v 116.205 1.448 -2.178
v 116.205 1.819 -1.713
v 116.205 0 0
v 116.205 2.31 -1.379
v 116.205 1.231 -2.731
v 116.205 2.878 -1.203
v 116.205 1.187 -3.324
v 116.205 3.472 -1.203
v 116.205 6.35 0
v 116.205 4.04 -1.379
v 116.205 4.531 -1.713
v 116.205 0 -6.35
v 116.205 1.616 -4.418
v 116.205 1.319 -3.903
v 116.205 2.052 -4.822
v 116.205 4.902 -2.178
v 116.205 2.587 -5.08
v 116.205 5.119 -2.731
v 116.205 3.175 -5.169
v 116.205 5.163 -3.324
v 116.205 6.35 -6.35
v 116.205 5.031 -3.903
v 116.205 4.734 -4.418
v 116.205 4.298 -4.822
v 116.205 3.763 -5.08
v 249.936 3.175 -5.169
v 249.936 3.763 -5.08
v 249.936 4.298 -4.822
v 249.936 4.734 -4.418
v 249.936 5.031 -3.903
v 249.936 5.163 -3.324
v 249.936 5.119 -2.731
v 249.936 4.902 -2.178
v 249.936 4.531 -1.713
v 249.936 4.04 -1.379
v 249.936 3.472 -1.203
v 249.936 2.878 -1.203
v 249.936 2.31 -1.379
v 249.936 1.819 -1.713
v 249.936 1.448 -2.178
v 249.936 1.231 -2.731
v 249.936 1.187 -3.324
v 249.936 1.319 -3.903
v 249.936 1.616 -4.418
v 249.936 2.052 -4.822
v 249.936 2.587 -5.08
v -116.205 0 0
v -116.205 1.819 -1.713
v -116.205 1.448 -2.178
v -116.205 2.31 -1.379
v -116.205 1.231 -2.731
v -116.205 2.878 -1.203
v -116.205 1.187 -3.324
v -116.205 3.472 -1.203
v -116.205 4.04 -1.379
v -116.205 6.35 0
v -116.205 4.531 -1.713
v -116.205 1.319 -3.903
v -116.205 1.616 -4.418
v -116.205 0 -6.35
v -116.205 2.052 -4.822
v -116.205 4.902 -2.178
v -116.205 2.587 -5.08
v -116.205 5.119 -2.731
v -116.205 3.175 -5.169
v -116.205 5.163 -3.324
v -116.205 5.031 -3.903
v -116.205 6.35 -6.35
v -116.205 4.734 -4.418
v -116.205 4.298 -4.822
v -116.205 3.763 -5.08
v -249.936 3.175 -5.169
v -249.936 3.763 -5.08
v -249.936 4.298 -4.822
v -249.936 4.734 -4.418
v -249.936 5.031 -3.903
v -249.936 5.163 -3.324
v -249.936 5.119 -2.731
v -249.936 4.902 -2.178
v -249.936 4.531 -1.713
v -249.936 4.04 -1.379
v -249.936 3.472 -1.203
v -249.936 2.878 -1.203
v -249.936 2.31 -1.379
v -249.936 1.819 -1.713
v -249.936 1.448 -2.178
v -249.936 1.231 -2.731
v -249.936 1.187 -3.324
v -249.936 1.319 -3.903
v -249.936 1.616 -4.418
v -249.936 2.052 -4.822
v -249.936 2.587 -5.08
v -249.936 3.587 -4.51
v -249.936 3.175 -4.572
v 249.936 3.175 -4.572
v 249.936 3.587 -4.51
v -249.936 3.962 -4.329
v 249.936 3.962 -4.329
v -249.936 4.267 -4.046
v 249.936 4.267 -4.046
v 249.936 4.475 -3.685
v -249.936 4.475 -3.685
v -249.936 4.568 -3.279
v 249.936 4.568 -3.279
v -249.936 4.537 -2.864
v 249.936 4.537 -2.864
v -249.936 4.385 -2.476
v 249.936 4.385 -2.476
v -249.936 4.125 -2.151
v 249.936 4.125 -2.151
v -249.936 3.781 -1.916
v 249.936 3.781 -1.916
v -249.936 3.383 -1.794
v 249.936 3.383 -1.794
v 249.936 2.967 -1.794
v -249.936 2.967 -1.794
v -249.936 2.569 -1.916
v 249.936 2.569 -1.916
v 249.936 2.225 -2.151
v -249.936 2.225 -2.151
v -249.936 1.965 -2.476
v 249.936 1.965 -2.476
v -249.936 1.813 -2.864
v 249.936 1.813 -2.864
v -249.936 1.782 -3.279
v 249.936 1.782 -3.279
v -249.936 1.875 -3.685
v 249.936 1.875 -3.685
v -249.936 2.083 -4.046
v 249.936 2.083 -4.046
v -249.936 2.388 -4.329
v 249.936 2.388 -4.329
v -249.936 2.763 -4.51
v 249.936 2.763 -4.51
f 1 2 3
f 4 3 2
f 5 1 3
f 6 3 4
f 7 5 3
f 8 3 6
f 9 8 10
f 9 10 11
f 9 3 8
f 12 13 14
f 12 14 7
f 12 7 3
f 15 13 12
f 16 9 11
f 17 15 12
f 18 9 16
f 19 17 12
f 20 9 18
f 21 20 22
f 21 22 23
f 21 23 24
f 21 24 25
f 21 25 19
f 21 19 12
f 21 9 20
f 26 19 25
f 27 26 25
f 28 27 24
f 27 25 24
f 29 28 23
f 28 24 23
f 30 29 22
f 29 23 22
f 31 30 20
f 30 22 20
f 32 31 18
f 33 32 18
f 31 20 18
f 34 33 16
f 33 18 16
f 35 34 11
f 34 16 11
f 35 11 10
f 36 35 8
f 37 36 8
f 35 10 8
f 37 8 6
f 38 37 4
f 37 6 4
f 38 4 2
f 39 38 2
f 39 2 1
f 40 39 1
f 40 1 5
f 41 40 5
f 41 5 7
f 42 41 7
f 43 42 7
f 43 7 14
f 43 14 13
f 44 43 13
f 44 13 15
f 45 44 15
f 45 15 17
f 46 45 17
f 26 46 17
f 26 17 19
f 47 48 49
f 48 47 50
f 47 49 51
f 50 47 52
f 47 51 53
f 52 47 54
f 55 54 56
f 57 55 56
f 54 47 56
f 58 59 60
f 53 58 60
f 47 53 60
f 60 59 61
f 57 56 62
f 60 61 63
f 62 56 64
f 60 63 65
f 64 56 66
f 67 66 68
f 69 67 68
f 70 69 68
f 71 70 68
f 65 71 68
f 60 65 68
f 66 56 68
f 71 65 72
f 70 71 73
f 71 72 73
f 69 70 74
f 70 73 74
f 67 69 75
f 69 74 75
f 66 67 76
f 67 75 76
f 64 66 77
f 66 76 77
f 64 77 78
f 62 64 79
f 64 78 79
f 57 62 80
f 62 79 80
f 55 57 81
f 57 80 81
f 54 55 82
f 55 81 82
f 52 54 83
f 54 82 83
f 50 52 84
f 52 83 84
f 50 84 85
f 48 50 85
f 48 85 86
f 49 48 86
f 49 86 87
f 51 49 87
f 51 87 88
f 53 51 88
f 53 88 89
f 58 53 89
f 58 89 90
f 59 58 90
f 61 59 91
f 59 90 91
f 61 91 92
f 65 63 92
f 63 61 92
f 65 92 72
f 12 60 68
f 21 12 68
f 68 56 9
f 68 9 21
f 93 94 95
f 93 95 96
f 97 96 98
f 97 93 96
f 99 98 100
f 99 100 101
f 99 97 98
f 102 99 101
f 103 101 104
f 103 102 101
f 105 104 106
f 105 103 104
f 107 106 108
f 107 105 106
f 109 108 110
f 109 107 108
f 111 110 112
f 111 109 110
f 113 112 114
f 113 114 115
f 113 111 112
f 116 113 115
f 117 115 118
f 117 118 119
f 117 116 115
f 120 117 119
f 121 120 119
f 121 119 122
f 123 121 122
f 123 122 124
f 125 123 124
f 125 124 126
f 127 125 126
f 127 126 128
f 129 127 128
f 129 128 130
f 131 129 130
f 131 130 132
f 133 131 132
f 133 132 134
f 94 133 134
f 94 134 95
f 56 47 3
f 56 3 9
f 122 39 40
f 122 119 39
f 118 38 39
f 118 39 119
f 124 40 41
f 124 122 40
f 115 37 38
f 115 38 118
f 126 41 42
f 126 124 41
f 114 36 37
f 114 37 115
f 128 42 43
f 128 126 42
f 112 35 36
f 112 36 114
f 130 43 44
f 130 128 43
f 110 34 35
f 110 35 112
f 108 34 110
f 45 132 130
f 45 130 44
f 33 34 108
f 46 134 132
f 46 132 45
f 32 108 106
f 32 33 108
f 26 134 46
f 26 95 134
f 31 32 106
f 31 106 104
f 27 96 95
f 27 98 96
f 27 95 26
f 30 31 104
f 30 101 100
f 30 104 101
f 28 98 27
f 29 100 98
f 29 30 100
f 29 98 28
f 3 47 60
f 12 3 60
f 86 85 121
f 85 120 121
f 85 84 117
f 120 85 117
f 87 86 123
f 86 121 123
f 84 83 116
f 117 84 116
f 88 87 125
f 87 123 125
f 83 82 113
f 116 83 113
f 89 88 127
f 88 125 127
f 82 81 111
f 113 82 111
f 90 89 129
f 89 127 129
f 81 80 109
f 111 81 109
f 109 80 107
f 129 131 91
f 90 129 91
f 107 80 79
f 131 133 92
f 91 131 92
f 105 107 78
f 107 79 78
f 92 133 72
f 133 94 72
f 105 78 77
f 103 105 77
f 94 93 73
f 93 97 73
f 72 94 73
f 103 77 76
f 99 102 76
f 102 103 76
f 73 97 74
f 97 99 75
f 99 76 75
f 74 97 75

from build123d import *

# Parameters (mm, degrees)
BOSS_EXTRUDE1_DEPTH      = 116.205
BOSS_EXTRUDE1_DEPTH_BACK = 116.205
SKETCH1_W                = 6.35
SKETCH1_H                = 6.35
SKETCH1_R                = 1.397
BOSS_EXTRUDE3_DEPTH      = 249.936
BOSS_EXTRUDE3_DEPTH_BACK = 249.936
SKETCH3_R                = 1.9939
SKETCH3_R_2              = 1.397


with BuildPart() as part:
    # Sketch1 → Boss-Extrude1 (new, two sides: drawn at the far end of the back side and taken through both)
    with BuildSketch(Plane(origin=(0, 0, 0), x_dir=(0, 0, -1), z_dir=(1, 0, 0)).offset(-BOSS_EXTRUDE1_DEPTH_BACK)):
        with Locations((3.175, 3.175)):
            Rectangle(SKETCH1_W, SKETCH1_H)
        with Locations((3.175, 3.175)):
            Circle(SKETCH1_R, mode=Mode.SUBTRACT)
    extrude(amount=BOSS_EXTRUDE1_DEPTH + BOSS_EXTRUDE1_DEPTH_BACK)

    # Sketch3 → Boss-Extrude3 (add, two sides: drawn at the far end of the back side and taken through both)
    with BuildSketch(Plane(origin=(0, 0, 0), x_dir=(0, 0, -1), z_dir=(1, 0, 0)).offset(-BOSS_EXTRUDE3_DEPTH_BACK)):
        with Locations((3.175, 3.175)):
            Circle(SKETCH3_R)
        with Locations((3.175, 3.175)):
            Circle(SKETCH3_R_2, mode=Mode.SUBTRACT)
    extrude(amount=BOSS_EXTRUDE3_DEPTH + BOSS_EXTRUDE3_DEPTH_BACK)


solid = part.part
